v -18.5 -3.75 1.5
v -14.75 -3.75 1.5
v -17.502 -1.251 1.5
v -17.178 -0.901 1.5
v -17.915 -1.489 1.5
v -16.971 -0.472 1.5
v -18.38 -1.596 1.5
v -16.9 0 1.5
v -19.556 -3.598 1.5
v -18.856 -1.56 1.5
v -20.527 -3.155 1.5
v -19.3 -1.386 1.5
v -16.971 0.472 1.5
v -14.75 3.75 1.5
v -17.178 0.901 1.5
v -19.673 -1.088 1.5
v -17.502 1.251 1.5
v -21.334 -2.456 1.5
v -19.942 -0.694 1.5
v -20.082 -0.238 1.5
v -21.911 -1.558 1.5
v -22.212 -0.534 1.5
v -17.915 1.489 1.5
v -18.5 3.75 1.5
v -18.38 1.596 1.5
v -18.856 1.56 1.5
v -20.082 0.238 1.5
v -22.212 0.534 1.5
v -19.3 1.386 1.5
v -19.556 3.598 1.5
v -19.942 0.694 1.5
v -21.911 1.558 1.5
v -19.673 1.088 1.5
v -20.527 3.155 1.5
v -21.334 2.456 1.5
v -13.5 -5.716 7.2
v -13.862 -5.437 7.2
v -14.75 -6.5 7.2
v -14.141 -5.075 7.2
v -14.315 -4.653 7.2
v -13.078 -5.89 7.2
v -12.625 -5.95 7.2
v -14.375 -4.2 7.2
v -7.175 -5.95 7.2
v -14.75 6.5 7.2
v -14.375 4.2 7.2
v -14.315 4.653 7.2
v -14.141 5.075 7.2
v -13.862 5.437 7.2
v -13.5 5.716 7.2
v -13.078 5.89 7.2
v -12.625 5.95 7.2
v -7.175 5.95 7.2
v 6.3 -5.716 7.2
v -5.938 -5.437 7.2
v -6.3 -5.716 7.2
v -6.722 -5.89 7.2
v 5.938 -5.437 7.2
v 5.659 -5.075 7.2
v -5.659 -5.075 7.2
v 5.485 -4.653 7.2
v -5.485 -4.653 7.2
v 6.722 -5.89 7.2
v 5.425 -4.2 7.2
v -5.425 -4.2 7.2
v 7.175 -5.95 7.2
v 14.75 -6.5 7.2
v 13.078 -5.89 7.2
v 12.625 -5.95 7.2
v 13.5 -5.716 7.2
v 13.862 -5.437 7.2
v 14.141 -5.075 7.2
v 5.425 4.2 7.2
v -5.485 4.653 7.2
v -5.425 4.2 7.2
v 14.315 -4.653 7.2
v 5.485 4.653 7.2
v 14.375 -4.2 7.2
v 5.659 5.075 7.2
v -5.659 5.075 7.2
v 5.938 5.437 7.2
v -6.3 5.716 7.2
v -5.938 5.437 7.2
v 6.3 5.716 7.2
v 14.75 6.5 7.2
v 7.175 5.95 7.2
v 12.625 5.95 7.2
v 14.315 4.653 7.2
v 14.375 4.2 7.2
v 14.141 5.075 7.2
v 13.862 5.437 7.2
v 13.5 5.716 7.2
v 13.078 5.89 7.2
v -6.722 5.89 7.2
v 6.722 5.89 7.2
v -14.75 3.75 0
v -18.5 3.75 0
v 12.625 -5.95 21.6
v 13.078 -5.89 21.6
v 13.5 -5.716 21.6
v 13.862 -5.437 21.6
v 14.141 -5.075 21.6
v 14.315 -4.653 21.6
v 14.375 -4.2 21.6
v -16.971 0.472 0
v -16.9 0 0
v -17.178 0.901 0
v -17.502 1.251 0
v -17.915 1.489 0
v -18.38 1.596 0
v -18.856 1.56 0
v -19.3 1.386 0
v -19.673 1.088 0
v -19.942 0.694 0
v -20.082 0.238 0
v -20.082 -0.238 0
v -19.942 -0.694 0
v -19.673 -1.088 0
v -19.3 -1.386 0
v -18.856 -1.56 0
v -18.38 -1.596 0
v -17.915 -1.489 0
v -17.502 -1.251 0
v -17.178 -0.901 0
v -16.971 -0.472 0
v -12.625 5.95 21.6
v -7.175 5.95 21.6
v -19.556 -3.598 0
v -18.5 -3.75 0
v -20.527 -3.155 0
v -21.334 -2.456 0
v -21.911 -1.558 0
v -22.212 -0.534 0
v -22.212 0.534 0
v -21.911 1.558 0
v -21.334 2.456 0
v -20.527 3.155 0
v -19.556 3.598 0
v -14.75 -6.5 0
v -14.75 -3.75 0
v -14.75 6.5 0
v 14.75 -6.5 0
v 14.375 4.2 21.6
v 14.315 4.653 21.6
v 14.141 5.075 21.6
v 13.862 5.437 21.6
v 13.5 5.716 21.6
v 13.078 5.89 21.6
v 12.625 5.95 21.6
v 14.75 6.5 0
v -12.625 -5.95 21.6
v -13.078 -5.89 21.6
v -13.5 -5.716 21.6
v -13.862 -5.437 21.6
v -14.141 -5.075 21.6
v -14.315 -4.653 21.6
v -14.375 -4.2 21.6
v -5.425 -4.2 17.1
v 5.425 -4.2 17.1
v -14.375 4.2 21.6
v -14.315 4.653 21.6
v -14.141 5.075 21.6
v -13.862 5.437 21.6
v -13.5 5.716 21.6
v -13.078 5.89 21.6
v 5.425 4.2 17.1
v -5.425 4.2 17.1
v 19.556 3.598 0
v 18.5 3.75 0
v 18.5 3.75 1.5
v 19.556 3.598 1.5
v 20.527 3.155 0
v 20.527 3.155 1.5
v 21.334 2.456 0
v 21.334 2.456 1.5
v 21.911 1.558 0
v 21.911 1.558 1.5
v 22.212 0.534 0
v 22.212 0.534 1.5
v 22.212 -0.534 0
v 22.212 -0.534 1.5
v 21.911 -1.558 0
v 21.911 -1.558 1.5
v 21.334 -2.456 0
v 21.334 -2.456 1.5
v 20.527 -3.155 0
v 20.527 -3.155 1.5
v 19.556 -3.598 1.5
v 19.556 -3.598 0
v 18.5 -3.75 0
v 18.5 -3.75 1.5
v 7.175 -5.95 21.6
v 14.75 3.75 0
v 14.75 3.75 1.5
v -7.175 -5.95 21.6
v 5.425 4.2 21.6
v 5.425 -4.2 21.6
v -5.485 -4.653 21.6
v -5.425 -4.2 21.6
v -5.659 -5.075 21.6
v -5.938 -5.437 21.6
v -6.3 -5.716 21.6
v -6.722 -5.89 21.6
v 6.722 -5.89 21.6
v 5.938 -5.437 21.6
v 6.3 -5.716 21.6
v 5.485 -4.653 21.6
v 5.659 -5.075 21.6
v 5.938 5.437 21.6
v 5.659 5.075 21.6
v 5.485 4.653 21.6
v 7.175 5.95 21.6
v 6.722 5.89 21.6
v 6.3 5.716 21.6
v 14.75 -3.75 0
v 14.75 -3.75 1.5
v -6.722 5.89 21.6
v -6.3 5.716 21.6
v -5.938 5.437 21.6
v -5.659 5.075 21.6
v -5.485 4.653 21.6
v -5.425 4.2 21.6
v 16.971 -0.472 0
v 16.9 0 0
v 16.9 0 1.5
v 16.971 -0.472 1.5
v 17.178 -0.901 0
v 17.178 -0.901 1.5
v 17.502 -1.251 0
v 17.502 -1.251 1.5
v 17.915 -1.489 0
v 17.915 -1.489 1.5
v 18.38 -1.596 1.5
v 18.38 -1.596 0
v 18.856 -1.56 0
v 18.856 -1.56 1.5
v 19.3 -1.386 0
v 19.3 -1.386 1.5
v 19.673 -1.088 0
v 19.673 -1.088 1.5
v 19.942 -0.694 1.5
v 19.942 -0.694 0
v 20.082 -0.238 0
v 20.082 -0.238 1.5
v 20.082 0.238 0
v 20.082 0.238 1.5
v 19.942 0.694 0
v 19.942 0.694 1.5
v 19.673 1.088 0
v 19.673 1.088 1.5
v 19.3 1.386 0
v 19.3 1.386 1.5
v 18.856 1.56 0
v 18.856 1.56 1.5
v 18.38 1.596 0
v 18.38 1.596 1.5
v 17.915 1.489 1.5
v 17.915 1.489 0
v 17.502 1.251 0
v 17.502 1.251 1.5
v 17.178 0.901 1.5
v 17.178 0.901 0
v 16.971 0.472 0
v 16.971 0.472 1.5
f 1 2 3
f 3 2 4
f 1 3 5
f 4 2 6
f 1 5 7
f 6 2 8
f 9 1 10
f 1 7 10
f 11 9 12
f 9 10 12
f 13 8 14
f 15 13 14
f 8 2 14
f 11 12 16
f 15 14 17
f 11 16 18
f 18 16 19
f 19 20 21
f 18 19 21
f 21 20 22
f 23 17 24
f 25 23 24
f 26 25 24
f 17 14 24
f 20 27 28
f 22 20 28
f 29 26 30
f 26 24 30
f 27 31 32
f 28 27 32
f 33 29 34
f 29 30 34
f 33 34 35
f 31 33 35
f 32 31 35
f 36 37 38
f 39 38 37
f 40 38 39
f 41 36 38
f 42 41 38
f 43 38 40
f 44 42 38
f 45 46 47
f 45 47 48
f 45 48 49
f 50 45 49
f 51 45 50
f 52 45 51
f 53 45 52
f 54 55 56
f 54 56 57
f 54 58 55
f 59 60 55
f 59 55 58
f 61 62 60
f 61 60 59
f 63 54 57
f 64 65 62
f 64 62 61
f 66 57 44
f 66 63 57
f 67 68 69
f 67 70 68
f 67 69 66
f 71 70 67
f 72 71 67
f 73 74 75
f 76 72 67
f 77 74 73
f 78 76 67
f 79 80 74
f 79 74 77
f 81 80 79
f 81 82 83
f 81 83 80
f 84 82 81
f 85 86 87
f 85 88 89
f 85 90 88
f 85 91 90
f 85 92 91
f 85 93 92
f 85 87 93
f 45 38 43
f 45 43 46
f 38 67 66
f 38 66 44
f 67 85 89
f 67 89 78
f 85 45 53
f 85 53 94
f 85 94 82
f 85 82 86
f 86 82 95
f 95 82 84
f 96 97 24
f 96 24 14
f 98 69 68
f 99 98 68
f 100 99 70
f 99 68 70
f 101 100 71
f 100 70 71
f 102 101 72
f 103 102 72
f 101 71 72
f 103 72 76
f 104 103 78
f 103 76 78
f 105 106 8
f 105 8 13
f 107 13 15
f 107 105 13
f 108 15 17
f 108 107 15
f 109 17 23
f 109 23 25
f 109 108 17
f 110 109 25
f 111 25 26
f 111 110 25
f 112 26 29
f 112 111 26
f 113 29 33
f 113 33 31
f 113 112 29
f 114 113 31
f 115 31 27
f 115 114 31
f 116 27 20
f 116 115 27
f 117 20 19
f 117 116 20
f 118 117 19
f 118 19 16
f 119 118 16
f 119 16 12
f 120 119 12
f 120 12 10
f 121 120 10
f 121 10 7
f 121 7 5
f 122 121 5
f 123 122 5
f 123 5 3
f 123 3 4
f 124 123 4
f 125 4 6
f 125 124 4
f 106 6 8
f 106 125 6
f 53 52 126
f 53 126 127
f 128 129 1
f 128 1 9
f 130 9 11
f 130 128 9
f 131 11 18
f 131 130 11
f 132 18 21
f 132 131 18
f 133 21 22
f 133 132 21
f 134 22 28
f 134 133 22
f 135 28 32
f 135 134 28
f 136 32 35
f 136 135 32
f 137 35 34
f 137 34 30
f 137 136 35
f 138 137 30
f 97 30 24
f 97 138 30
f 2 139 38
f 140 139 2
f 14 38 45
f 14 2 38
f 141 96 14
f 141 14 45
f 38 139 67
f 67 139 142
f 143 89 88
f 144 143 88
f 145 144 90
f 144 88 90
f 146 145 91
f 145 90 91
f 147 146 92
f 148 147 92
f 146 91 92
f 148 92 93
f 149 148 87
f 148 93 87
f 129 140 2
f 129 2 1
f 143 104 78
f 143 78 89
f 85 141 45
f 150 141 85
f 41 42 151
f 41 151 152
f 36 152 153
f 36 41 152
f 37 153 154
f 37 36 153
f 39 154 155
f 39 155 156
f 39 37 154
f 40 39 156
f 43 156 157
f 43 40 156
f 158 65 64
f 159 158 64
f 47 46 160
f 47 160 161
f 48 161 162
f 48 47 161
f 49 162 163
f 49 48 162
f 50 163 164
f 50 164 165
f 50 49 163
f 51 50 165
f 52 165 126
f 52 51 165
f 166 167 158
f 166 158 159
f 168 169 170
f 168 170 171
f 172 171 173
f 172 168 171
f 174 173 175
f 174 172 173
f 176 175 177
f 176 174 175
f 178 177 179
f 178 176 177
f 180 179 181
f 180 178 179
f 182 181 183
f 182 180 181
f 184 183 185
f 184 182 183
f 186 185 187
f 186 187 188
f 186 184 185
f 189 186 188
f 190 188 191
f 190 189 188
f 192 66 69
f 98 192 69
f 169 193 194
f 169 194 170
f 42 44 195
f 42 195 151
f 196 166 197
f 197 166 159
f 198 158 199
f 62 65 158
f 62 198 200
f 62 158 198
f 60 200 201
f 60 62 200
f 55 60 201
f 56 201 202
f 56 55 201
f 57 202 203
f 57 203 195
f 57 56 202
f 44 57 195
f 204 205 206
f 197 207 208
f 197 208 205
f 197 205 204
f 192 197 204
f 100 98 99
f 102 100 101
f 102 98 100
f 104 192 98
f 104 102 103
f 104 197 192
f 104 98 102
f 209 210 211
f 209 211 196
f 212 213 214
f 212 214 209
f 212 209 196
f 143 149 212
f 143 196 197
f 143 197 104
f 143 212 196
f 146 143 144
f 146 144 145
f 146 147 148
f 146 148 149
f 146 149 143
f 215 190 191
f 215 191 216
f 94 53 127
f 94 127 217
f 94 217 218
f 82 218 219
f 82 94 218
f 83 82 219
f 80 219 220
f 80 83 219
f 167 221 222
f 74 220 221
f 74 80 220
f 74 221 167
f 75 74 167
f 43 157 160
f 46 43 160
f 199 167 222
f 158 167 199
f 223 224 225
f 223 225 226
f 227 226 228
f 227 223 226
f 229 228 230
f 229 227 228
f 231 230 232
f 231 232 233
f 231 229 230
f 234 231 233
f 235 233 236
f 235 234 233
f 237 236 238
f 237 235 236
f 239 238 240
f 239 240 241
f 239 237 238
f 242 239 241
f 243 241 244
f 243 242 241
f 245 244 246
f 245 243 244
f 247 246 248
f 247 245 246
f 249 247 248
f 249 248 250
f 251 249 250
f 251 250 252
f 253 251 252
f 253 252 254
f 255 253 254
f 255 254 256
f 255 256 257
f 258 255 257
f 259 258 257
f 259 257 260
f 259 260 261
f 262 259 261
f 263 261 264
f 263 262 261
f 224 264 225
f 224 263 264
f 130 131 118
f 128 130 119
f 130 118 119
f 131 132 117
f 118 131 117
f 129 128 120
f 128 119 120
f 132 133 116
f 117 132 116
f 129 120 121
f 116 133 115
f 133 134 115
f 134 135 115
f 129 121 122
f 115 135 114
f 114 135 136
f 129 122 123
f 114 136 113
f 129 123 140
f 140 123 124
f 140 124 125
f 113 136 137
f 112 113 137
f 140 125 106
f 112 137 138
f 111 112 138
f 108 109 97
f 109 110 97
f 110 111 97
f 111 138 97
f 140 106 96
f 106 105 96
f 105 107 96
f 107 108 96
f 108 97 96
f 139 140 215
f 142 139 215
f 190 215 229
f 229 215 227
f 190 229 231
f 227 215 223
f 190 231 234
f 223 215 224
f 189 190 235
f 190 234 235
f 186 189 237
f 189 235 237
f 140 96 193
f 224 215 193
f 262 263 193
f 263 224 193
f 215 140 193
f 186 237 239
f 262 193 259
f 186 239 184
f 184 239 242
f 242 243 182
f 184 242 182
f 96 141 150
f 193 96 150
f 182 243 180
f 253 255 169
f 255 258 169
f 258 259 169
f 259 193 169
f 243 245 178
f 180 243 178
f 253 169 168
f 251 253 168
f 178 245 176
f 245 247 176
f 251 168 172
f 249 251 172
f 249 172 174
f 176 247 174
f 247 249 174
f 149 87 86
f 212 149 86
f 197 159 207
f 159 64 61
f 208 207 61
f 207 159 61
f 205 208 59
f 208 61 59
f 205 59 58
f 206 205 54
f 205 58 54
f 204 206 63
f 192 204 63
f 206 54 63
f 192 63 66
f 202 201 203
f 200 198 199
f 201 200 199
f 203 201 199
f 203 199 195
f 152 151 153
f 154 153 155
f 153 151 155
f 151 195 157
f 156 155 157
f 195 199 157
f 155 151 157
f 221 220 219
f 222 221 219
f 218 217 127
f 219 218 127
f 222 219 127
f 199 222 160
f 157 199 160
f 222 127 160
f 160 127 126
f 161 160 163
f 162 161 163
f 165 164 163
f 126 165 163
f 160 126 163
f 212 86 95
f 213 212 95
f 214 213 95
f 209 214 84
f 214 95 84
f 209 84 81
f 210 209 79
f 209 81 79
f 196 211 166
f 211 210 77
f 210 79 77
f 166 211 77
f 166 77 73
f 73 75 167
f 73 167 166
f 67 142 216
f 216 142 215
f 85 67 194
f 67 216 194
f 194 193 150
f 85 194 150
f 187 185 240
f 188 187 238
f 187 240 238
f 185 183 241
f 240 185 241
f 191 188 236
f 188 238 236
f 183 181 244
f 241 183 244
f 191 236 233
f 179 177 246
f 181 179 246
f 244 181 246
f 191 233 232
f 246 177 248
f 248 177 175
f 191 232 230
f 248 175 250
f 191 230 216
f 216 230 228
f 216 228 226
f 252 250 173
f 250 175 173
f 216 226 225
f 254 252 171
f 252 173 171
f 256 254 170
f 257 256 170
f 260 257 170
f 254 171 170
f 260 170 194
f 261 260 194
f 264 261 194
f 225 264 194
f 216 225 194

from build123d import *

# Parameters (mm, degrees)
SKETCH_1_W      = 29.5
SKETCH_1_H      = 13
EXTRUDE_1_DEPTH = 7.2
SKETCH_3_R      = 1.6
EXTRUDE_2_DEPTH = 1.5
EXTRUDE_3_DEPTH = 14.4
SKETCH_5_W      = 10.85
SKETCH_5_H      = 8.4
EXTRUDE_4_DEPTH = 9.9


with BuildPart() as part:
    # 스케치1 → 보스-돌출1 (new body)
    with BuildSketch(Plane.XY):
        Rectangle(SKETCH_1_W, SKETCH_1_H)
    extrude(amount=EXTRUDE_1_DEPTH)

    # 스케치3 → 보스-돌출2 (add)
    # profile 1 of 2: a face of its own
    with BuildSketch(Plane.XY):
        with BuildLine():
            Line((-18.5, 3.75), (-14.75, 3.75))
            Line((-14.75, 3.75), (-14.75, -3.75))
            Line((-14.75, -3.75), (-18.5, -3.75))
            ThreePointArc((-18.5, -3.75), (-22.25, 0), (-18.5, 3.75))
        make_face()
        with Locations((-18.5, 0)):
            Circle(SKETCH_3_R, mode=Mode.SUBTRACT)
    # profile 2 of 2: a face of its own
    with BuildSketch(Plane.XY):
        with BuildLine():
            Line((14.75, -3.75), (14.75, 3.75))
            Line((14.75, 3.75), (18.5, 3.75))
            ThreePointArc((18.5, 3.75), (22.25, 0), (18.5, -3.75))
            Line((18.5, -3.75), (14.75, -3.75))
        make_face()
        with Locations(Location((18.5, 0, 0), (0, 0, 180))):
            Circle(SKETCH_3_R, mode=Mode.SUBTRACT)
    extrude(amount=EXTRUDE_2_DEPTH)

    # 스케치4 → 보스-돌출3 (add)
    with BuildSketch(Plane.XY.offset(7.2)):
        with BuildLine():
            Line((-7.175, -5.95), (-12.625, -5.95))
            ThreePointArc((-12.625, -5.95), (-13.862436867, -5.437436867), (-14.375, -4.2))
            Line((-14.375, -4.2), (-14.375, 4.2))
            ThreePointArc((-14.375, 4.2), (-13.862436867, 5.437436867), (-12.625, 5.95))
            Line((-12.625, 5.95), (-7.175, 5.95))
            ThreePointArc((-7.175, 5.95), (-5.937563133, 5.437436867), (-5.425, 4.2))
            Line((-5.425, 4.2), (-5.425, -4.2))
            ThreePointArc((-5.425, -4.2), (-5.937563133, -5.437436867), (-7.175, -5.95))
        make_face()
        with BuildLine():
            Line((14.375, -4.2), (14.375, 4.2))
            ThreePointArc((14.375, 4.2), (13.862436867, 5.437436867), (12.625, 5.95))
            Line((12.625, 5.95), (7.175, 5.95))
            ThreePointArc((7.175, 5.95), (5.937563133, 5.437436867), (5.425, 4.2))
            Line((5.425, 4.2), (5.425, -4.2))
            ThreePointArc((5.425, -4.2), (5.937563133, -5.437436867), (7.175, -5.95))
            Line((7.175, -5.95), (12.625, -5.95))
            ThreePointArc((12.625, -5.95), (13.862436867, -5.437436867), (14.375, -4.2))
        make_face()
    extrude(amount=EXTRUDE_3_DEPTH)

    # 스케치5 → 보스-돌출4 (add)
    with BuildSketch(Plane.XY.offset(7.2)):
        Rectangle(SKETCH_5_W, SKETCH_5_H)
    extrude(amount=EXTRUDE_4_DEPTH)


solid = part.part
